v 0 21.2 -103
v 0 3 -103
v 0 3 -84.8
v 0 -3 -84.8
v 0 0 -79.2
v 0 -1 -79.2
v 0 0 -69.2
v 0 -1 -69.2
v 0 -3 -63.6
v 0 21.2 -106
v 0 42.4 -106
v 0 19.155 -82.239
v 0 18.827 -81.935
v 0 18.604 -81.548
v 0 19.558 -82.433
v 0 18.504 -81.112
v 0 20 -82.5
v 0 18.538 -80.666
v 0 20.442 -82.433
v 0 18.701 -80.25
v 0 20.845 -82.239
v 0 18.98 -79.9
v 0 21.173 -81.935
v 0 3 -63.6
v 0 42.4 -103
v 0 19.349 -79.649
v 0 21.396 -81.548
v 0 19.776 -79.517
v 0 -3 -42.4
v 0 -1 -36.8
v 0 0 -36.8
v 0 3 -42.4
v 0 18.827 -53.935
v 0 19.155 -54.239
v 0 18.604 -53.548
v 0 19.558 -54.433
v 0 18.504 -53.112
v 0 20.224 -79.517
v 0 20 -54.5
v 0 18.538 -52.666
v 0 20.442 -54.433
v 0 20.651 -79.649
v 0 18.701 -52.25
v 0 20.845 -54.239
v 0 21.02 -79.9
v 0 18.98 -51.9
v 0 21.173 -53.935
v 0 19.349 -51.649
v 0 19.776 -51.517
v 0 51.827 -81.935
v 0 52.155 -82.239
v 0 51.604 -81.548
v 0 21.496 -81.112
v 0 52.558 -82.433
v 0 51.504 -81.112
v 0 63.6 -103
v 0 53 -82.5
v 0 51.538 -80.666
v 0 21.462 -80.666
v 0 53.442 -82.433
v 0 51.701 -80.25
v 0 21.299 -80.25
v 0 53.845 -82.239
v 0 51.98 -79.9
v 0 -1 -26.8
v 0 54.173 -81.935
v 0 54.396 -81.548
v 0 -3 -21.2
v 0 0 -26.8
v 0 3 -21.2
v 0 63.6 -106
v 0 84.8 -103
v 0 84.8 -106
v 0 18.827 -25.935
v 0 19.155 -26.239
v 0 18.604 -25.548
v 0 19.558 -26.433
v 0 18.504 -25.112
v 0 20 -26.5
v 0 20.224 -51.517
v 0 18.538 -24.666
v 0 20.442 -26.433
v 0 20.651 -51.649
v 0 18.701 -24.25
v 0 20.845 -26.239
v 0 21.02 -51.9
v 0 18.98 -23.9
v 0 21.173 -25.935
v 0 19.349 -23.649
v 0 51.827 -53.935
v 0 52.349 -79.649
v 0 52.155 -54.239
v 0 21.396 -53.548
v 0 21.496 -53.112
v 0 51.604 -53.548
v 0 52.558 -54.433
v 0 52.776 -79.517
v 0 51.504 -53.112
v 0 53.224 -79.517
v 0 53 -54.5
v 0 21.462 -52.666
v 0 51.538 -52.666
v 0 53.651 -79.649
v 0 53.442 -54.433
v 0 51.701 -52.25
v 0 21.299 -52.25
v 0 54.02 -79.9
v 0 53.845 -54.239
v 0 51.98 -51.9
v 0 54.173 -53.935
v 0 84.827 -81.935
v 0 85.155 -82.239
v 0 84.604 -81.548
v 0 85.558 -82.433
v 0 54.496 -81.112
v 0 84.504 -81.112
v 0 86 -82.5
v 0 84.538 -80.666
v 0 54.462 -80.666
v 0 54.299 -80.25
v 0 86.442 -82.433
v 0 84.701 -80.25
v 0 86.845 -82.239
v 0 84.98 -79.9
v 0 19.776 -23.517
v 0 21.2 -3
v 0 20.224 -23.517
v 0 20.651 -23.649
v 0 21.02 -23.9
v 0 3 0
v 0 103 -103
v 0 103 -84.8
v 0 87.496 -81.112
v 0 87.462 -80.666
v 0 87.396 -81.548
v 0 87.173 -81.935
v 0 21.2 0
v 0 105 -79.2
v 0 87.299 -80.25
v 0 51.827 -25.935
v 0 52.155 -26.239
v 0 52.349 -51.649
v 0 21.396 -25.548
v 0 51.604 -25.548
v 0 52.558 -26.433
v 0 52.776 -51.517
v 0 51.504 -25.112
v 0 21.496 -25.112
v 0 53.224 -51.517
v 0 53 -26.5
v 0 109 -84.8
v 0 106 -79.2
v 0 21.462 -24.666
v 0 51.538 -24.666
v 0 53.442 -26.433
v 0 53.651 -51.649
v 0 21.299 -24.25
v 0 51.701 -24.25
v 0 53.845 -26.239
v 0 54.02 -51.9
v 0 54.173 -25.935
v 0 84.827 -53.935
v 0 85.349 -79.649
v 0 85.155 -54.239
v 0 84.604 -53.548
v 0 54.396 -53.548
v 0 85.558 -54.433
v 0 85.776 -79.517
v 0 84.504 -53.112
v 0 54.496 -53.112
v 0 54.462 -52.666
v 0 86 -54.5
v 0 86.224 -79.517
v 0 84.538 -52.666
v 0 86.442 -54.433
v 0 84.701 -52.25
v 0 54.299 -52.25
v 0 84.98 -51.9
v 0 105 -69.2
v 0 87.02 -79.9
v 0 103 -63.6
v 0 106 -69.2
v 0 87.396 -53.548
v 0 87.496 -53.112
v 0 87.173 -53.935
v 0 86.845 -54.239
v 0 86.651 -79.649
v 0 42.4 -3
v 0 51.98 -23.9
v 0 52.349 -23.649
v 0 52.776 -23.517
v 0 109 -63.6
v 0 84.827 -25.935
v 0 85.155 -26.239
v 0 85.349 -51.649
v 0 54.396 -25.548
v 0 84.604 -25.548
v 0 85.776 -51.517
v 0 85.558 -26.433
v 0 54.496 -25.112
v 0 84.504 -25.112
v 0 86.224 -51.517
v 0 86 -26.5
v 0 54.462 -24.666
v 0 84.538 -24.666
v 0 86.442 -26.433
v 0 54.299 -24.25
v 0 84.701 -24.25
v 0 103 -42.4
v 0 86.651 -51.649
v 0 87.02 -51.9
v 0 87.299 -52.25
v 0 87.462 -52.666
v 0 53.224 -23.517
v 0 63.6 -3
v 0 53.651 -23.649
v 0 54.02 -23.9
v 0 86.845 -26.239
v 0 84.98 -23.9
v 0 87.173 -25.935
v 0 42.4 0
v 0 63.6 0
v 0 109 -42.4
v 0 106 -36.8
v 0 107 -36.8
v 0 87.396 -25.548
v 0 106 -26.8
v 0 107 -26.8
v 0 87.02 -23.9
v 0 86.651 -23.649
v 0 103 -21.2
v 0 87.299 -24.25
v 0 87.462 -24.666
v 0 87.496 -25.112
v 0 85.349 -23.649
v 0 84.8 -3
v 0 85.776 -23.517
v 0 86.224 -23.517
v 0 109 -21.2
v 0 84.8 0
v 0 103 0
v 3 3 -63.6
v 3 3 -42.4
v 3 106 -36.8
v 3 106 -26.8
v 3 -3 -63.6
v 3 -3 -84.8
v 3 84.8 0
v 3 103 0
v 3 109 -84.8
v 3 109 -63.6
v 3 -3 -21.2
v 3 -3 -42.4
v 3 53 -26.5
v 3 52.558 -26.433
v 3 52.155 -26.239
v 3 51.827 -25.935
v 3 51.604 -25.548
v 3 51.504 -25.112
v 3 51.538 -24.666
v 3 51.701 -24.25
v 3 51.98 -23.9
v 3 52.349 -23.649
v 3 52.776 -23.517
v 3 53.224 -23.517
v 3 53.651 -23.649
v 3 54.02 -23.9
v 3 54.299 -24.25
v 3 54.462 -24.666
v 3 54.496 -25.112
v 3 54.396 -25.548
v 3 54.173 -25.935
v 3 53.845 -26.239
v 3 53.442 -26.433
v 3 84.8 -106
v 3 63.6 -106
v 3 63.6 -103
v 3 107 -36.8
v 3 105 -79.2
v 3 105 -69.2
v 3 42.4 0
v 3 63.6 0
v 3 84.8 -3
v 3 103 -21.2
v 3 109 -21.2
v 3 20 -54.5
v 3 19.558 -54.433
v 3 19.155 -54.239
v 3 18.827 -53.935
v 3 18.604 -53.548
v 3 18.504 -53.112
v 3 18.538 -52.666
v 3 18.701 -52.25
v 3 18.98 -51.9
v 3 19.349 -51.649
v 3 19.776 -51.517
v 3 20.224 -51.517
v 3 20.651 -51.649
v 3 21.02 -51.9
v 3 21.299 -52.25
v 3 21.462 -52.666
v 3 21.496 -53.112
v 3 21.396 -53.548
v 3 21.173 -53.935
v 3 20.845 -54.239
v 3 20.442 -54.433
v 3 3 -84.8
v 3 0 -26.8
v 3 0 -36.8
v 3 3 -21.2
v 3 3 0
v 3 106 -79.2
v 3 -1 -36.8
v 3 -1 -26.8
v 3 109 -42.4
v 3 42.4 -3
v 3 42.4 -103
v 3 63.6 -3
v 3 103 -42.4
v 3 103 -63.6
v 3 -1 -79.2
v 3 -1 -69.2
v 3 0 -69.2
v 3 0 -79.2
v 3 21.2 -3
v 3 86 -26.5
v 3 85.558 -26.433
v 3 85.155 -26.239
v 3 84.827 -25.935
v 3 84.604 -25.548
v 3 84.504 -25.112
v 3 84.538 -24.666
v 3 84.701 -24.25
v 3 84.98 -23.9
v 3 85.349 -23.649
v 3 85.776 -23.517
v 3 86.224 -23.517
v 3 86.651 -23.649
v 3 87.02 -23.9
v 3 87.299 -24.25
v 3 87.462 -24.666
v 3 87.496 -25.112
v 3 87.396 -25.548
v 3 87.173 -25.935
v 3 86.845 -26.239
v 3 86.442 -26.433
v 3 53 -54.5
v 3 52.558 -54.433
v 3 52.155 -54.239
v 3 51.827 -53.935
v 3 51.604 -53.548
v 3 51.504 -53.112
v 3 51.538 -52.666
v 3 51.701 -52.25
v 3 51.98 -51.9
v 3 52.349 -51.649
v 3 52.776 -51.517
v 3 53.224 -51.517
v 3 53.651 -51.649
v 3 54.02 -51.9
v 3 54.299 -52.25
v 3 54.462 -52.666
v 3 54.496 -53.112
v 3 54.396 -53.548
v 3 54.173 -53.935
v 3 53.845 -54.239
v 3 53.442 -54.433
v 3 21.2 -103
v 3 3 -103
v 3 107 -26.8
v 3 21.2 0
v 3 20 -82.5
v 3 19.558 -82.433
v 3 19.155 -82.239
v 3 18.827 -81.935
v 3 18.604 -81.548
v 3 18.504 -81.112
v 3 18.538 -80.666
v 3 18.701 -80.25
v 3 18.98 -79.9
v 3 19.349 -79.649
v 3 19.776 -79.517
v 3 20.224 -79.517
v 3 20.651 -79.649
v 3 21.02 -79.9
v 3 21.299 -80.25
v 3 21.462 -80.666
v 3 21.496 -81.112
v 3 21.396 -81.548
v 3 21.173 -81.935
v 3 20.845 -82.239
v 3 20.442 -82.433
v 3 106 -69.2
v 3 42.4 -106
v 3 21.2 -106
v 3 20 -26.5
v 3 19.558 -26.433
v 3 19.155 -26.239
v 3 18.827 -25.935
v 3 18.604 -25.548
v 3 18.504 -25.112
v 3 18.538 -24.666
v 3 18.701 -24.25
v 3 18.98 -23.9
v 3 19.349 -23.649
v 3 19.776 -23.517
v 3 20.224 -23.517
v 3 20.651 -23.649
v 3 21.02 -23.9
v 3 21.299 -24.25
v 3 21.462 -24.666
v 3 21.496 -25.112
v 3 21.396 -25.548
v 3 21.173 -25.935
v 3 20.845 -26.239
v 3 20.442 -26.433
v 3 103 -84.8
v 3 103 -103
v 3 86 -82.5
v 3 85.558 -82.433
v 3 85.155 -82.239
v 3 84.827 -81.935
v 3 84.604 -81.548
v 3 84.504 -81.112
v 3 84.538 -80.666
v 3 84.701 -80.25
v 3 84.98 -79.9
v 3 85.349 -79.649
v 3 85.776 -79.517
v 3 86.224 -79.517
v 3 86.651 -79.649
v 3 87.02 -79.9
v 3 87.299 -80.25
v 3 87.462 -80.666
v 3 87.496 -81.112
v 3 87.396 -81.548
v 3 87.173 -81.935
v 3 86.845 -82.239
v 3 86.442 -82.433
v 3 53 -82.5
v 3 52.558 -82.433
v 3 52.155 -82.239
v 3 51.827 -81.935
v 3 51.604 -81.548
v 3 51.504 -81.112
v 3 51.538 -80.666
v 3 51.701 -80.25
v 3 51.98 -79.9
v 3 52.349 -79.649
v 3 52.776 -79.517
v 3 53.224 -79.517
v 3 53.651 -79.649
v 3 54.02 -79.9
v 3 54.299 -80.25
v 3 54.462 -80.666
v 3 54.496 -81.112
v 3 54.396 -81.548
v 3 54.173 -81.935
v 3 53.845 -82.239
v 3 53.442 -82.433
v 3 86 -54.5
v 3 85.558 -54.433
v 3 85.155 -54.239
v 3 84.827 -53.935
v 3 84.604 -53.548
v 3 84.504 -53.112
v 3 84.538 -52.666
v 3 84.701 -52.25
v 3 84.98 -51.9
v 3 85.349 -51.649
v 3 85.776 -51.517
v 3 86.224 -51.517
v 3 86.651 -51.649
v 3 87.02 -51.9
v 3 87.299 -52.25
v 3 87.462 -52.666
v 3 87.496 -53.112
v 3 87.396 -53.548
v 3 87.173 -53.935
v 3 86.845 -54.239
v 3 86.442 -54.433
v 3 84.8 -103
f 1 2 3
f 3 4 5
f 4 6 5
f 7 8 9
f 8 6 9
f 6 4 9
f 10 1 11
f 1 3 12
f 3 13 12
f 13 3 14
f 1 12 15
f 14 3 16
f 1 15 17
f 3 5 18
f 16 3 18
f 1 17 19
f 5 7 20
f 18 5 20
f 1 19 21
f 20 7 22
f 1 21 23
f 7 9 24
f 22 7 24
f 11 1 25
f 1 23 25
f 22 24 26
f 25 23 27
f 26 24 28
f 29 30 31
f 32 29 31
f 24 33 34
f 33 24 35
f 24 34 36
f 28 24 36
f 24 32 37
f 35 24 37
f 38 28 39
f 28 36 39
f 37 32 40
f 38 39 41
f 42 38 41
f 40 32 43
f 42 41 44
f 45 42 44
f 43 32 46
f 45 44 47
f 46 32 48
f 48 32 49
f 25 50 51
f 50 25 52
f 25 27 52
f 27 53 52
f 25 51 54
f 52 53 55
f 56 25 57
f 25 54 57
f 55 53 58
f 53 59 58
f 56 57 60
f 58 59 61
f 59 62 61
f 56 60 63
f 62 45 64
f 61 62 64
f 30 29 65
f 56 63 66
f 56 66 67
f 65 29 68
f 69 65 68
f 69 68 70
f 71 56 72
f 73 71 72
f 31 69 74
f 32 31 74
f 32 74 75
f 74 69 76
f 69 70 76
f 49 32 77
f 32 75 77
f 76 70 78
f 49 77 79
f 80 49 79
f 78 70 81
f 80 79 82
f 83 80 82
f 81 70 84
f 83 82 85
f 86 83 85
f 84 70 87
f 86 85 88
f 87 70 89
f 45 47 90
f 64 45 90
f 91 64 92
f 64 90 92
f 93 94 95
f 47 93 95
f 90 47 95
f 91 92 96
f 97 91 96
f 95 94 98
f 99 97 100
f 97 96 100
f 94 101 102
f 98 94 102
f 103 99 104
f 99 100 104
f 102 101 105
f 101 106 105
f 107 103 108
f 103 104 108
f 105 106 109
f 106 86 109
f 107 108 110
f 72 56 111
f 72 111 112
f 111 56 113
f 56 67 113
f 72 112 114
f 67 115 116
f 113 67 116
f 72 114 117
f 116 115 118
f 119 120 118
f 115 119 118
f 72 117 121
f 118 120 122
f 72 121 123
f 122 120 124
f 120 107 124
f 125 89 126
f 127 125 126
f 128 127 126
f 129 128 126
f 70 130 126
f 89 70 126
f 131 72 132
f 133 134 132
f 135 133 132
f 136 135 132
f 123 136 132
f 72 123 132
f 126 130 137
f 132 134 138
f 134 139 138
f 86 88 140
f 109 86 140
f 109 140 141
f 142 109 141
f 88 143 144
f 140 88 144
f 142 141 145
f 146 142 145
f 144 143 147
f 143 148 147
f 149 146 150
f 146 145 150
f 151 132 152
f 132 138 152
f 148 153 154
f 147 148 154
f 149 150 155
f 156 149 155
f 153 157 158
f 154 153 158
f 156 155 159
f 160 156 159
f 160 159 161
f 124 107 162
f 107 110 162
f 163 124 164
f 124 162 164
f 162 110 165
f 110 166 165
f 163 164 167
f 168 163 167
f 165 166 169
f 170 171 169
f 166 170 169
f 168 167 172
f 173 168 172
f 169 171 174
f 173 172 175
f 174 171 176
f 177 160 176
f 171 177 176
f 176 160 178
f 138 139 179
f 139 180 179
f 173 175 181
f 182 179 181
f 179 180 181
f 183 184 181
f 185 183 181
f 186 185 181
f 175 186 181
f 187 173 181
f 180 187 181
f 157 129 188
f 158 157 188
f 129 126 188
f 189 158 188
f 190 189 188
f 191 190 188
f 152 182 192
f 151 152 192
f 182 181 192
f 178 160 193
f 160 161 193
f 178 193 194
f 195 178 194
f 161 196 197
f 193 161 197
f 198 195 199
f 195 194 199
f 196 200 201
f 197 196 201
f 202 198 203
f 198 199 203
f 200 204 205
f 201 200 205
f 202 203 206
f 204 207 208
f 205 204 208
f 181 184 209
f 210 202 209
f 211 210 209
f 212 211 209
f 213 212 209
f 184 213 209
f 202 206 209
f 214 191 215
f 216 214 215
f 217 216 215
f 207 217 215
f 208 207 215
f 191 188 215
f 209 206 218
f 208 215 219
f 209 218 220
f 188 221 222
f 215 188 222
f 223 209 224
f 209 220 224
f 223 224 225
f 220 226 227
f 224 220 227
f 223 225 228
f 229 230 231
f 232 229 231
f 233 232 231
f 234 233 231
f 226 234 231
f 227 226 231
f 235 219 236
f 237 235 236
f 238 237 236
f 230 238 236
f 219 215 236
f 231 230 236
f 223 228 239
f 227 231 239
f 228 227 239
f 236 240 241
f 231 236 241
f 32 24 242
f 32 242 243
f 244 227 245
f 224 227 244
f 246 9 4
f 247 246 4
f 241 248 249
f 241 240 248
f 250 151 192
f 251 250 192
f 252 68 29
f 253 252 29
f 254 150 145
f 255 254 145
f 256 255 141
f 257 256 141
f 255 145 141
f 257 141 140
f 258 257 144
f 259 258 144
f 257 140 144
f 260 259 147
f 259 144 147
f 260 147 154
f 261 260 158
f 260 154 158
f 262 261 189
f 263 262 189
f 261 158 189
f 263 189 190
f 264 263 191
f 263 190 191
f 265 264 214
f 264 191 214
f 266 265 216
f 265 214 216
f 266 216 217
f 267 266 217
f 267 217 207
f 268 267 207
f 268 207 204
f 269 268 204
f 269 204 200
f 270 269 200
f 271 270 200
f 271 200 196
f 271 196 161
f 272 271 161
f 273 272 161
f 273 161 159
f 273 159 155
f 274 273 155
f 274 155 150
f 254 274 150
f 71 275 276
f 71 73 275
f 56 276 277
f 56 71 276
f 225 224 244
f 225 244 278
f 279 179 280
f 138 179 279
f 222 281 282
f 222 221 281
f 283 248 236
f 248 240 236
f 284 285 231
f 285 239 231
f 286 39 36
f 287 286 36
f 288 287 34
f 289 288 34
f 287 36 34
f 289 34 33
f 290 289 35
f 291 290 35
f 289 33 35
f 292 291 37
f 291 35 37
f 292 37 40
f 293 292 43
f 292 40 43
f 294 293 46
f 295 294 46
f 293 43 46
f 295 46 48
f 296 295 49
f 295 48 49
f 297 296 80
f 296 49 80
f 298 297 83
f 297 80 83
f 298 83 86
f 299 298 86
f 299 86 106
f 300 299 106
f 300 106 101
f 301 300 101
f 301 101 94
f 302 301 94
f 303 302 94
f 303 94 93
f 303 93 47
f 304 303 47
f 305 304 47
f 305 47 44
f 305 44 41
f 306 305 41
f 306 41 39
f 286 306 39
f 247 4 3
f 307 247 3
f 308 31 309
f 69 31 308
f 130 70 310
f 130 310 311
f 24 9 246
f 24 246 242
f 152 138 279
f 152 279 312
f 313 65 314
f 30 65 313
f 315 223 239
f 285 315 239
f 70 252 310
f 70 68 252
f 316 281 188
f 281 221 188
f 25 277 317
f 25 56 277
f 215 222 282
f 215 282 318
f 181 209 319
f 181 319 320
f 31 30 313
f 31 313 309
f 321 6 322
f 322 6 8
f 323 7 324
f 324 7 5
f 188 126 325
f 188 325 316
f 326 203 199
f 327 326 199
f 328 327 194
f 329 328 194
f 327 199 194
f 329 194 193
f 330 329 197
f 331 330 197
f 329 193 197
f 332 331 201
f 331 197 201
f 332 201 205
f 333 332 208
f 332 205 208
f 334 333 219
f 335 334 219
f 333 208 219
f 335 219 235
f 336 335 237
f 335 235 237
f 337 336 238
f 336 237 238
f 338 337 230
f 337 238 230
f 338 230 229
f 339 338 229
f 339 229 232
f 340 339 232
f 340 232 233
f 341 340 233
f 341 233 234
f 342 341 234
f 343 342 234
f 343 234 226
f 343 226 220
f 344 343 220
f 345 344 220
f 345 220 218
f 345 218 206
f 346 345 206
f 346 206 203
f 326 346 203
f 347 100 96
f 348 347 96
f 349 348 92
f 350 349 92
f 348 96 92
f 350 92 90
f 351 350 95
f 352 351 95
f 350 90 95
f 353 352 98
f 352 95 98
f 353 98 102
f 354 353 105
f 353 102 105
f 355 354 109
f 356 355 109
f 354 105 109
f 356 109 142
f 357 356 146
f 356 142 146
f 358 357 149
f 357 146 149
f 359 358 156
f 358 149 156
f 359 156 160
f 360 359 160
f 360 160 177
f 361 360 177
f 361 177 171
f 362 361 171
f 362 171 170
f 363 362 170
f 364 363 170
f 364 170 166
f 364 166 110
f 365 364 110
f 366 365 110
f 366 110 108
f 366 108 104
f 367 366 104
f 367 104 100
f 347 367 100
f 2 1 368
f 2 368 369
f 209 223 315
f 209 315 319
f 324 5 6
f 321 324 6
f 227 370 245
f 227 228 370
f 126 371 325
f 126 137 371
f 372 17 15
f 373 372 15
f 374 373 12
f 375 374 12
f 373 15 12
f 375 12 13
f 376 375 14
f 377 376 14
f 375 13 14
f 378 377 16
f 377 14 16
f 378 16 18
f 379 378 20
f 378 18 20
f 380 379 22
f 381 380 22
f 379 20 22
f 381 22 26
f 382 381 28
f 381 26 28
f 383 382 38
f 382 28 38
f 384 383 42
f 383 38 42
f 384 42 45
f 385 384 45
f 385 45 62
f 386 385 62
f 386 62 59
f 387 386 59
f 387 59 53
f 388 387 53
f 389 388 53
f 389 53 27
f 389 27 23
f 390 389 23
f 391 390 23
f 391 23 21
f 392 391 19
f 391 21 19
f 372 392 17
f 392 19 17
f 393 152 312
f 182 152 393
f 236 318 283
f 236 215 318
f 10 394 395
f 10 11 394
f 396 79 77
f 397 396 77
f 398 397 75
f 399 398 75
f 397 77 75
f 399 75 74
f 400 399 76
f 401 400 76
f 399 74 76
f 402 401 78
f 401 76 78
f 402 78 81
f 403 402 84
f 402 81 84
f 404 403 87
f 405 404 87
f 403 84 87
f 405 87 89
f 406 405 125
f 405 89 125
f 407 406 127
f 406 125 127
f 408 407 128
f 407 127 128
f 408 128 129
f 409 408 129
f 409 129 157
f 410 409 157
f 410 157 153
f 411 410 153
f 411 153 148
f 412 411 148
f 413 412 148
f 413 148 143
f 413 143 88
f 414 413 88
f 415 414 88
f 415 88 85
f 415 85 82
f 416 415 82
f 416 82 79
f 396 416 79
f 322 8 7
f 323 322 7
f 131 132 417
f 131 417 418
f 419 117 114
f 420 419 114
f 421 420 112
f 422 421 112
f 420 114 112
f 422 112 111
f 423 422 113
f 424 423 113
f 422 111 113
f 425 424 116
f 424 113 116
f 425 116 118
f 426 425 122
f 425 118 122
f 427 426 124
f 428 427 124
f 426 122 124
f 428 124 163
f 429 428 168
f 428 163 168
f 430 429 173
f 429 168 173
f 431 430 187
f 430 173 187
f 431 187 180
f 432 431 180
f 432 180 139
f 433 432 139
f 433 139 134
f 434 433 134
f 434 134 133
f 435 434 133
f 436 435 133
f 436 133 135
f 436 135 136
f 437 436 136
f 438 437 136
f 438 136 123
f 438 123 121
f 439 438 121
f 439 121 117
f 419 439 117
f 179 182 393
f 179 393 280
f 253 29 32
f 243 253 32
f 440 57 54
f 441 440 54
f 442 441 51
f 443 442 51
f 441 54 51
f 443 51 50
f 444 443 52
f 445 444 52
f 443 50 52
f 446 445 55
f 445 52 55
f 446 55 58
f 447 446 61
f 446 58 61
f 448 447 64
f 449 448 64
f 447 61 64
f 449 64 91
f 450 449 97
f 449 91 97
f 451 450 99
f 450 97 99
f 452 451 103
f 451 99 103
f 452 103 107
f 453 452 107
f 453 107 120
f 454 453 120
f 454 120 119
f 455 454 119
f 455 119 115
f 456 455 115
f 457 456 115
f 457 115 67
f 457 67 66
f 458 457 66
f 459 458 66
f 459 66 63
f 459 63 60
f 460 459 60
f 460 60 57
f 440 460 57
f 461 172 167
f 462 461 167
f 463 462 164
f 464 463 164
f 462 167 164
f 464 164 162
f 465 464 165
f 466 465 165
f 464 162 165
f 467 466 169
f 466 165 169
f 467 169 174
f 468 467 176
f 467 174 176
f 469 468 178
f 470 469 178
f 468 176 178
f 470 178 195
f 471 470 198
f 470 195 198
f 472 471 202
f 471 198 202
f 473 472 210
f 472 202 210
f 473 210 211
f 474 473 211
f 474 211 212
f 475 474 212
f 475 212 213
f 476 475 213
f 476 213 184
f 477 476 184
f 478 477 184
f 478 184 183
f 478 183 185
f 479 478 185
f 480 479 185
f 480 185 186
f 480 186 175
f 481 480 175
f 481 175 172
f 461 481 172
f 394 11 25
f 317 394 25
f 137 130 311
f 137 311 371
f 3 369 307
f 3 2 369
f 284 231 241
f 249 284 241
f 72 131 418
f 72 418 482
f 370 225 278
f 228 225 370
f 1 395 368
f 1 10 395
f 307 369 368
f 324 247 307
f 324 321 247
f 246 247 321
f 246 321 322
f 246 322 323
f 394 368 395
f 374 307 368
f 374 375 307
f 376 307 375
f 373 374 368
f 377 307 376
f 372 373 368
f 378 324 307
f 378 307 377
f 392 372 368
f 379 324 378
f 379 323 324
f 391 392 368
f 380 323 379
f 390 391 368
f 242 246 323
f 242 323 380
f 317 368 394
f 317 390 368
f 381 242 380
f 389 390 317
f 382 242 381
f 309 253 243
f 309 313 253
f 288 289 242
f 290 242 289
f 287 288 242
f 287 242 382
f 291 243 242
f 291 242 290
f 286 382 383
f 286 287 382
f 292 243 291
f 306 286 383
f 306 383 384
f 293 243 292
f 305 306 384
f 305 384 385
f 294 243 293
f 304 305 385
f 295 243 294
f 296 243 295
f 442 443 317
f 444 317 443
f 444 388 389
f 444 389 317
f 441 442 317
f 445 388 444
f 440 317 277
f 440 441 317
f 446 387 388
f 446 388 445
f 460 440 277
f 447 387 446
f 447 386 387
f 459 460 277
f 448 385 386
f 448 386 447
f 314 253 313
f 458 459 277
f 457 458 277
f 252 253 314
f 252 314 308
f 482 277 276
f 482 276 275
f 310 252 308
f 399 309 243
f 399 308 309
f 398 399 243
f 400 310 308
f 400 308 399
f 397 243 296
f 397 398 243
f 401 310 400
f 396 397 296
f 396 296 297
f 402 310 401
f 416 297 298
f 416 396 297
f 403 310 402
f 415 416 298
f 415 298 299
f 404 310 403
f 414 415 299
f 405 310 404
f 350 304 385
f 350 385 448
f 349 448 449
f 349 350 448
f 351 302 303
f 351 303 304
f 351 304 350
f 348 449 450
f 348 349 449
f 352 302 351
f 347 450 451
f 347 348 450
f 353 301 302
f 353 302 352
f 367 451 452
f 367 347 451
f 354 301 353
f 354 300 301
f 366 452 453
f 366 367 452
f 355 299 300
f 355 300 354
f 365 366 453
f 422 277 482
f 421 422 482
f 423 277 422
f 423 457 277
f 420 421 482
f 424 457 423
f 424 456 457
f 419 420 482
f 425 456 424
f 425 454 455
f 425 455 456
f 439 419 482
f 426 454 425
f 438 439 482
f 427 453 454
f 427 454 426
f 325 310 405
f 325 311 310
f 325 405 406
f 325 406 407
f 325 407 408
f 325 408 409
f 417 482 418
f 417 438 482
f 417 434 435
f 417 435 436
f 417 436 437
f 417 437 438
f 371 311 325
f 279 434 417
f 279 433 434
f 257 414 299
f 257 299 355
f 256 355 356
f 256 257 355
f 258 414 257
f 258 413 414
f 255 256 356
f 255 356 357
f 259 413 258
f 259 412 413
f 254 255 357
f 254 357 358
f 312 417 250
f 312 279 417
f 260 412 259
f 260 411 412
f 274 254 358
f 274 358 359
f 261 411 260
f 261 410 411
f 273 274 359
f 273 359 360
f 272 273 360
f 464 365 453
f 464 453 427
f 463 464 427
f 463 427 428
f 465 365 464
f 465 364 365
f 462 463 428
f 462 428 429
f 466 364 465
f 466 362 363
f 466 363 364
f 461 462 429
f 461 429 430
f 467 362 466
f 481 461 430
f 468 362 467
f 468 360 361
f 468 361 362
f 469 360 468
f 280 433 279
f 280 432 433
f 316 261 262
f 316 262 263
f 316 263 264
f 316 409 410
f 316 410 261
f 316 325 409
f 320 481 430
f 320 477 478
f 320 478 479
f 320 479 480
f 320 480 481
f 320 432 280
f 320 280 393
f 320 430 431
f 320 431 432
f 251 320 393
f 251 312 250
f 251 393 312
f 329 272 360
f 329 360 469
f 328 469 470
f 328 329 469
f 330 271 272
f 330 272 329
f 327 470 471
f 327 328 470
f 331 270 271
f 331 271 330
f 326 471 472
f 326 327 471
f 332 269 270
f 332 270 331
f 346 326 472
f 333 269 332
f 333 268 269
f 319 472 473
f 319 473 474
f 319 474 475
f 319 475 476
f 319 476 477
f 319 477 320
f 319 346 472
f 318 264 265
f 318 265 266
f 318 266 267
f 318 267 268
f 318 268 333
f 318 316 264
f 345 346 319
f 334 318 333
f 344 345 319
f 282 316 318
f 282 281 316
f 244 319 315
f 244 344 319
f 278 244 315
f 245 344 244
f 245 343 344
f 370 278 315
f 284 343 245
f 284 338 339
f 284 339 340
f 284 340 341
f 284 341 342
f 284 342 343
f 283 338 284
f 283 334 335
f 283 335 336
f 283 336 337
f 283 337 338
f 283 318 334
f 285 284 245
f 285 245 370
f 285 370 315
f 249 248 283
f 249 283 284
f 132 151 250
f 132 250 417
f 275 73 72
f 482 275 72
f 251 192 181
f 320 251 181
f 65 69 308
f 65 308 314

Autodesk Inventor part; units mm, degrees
ref_plane "YZ Plane" through (0, 0, 0) normal (1, 0, 0) x (0, 1, 0)
ref_plane "XZ Plane" through (0, 0, 0) normal (0, 1, 0) x (-1, 0, 0)
ref_plane "XY Plane" through (0, 0, 0) normal (0, 0, 1) x (1, 0, 0)
sketch "Sketch1" plane through (0, 0, 0) normal (1, 0, 0) x (0, 1, 0)
  line L0 (21.2, 0) -> (21.2, -3)
  line L1 (42.4, 0) -> (42.4, -3)
  line L2 (63.6, 0) -> (63.6, -3)
  line L3 (84.8, 0) -> (84.8, -3)
  line L4 (-3, -21.2) -> (3, -21.2)
  line L5 (-3, -42.4) -> (3, -42.4)
  line L6 (-3, -63.6) -> (3, -63.6)
  line L7 (-3, -84.8) -> (3, -84.8)
  line L8 (21.2, -106) -> (21.2, -103)
  line L9 (42.4, -106) -> (42.4, -103)
  line L10 (63.6, -106) -> (63.6, -103)
  line L11 (84.8, -106) -> (84.8, -103)
  line L12 (109, -84.8) -> (103, -84.8)
  line L13 (109, -63.6) -> (103, -63.6)
  line L14 (109, -42.4) -> (103, -42.4)
  line L15 (109, -21.2) -> (103, -21.2)
  line L16 (3, -103) -> (3, -84.8)
  line L17 (3, -63.6) -> (3, -42.4)
  line L18 (3, -21.2) -> (3, -3)
  line L19 (103, -3) -> (103, -21.2)
  line L20 (103, -42.4) -> (103, -63.6)
  line L21 (103, -84.8) -> (103, -103)
  line L22 (21.2, -103) -> (3, -103)
  line L23 (84.8, -106) -> (63.6, -106)
  line L24 (42.4, -106) -> (21.2, -106)
  line L25 (103, -103) -> (84.8, -103)
  line L26 (63.6, -103) -> (42.4, -103)
  line L27 (103, -3) -> (103, 0)
  line L28 (3, -3) -> (3, 0)
  line L29 (3, 0) -> (21.2, 0)
  line L30 (21.2, -3) -> (42.4, -3)
  line L31 (63.6, -3) -> (84.8, -3)
  line L32 (42.4, 0) -> (63.6, 0)
  line L33 (84.8, 0) -> (103, 0)
  line L34 (-3, -21.2) -> (-3, -42.4)
  line L35 (-3, -63.6) -> (-3, -84.8)
  line L36 (109, -84.8) -> (109, -63.6)
  line L37 (109, -42.4) -> (109, -21.2)
  line L38 (0, -26.8) -> (-1, -26.8)
  line L39 (-1, -26.8) -> (-1, -36.8)
  line L40 (-1, -36.8) -> (0, -36.8)
  line L41 (0, -36.8) -> (0, -26.8)
  line L42 (107, -26.8) -> (106, -26.8)
  line L43 (106, -26.8) -> (106, -36.8)
  line L44 (106, -36.8) -> (107, -36.8)
  line L45 (107, -36.8) -> (107, -26.8)
  line L46 (-1, -69.2) -> (0, -69.2)
  line L47 (0, -69.2) -> (0, -79.2)
  line L48 (0, -79.2) -> (-1, -79.2)
  line L49 (-1, -79.2) -> (-1, -69.2)
  line L50 (106, -69.2) -> (105, -69.2)
  line L51 (105, -69.2) -> (105, -79.2)
  line L52 (105, -79.2) -> (106, -79.2)
  line L53 (106, -79.2) -> (106, -69.2)
  point P0 (0, 0)
  dimension "d94" = 1
  dimension "d95" = 10
  dimension "d96" = 1
  dimension "d97" = 10
  dimension "d98" = 10
  dimension "d99" = 1
  dimension "d100" = 10
extrude "Extrusion1" add sketch "Sketch1" along normal blind 3
sketch "Sketch3" plane through (3, 0, 0) normal (1, 0, 0) x (0, 0, -1)
  circle A0 centre (25, 20) radius 1.5
  point P0 (0, 0)
  dimension "d22" = 3
hole "Hole2" at (3, 20, -25) direction (-1, 0, 0) diameter 3 end through all
sketch "Sketch4" plane through (3, 0, 0) normal (1, 0, 0) x (0, 0, -1)
  circle A0 centre (25, 53) radius 1.5
  point P0 (0, 0)
  dimension "d30" = 3
hole "Hole3" at (3, 53, -25) direction (-1, 0, 0) diameter 3 end through all
sketch "Sketch5" plane through (3, 0, 0) normal (1, 0, 0) x (0, 0, -1)
  circle A0 centre (25, 86) radius 1.5
  point P0 (0, 0)
  dimension "d38" = 3
hole "Hole4" at (3, 86, -25) direction (-1, 0, 0) diameter 3 end through all
sketch "Sketch6" plane through (3, 0, 0) normal (1, 0, 0) x (0, 0, -1)
  circle A0 centre (53, 20) radius 1.5
  point P0 (0, 0)
  dimension "d46" = 3
hole "Hole5" at (3, 20, -53) direction (-1, 0, 0) diameter 3 end through all
sketch "Sketch7" plane through (3, 0, 0) normal (1, 0, 0) x (0, 0, -1)
  circle A0 centre (53, 53) radius 1.5
  point P0 (0, 0)
  dimension "d54" = 3
hole "Hole6" at (3, 53, -53) direction (-1, 0, 0) diameter 3 end through all
sketch "Sketch8" plane through (3, 0, 0) normal (1, 0, 0) x (0, 0, -1)
  circle A0 centre (53, 86) radius 1.5
  point P0 (0, 0)
  dimension "d62" = 3
hole "Hole7" at (3, 86, -53) direction (-1, 0, 0) diameter 3 end through all
sketch "Sketch9" plane through (3, 0, 0) normal (1, 0, 0) x (0, 0, -1)
  circle A0 centre (81, 20) radius 1.5
  point P0 (0, 0)
  dimension "d70" = 3
hole "Hole8" at (3, 20, -81) direction (-1, 0, 0) diameter 3 end through all
sketch "Sketch10" plane through (3, 0, 0) normal (1, 0, 0) x (0, 0, -1)
  circle A0 centre (81, 53) radius 1.5
  point P0 (0, 0)
  dimension "d78" = 3
hole "Hole9" at (3, 53, -81) direction (-1, 0, 0) diameter 3 end through all
sketch "Sketch11" plane through (3, 0, 0) normal (1, 0, 0) x (0, 0, -1)
  circle A0 centre (81, 86) radius 1.5
  point P0 (0, 0)
  dimension "d86" = 3
hole "Hole10" at (3, 86, -81) direction (-1, 0, 0) diameter 3 end through all
properties part number "Box side 3" material "PMMA Plastic"
